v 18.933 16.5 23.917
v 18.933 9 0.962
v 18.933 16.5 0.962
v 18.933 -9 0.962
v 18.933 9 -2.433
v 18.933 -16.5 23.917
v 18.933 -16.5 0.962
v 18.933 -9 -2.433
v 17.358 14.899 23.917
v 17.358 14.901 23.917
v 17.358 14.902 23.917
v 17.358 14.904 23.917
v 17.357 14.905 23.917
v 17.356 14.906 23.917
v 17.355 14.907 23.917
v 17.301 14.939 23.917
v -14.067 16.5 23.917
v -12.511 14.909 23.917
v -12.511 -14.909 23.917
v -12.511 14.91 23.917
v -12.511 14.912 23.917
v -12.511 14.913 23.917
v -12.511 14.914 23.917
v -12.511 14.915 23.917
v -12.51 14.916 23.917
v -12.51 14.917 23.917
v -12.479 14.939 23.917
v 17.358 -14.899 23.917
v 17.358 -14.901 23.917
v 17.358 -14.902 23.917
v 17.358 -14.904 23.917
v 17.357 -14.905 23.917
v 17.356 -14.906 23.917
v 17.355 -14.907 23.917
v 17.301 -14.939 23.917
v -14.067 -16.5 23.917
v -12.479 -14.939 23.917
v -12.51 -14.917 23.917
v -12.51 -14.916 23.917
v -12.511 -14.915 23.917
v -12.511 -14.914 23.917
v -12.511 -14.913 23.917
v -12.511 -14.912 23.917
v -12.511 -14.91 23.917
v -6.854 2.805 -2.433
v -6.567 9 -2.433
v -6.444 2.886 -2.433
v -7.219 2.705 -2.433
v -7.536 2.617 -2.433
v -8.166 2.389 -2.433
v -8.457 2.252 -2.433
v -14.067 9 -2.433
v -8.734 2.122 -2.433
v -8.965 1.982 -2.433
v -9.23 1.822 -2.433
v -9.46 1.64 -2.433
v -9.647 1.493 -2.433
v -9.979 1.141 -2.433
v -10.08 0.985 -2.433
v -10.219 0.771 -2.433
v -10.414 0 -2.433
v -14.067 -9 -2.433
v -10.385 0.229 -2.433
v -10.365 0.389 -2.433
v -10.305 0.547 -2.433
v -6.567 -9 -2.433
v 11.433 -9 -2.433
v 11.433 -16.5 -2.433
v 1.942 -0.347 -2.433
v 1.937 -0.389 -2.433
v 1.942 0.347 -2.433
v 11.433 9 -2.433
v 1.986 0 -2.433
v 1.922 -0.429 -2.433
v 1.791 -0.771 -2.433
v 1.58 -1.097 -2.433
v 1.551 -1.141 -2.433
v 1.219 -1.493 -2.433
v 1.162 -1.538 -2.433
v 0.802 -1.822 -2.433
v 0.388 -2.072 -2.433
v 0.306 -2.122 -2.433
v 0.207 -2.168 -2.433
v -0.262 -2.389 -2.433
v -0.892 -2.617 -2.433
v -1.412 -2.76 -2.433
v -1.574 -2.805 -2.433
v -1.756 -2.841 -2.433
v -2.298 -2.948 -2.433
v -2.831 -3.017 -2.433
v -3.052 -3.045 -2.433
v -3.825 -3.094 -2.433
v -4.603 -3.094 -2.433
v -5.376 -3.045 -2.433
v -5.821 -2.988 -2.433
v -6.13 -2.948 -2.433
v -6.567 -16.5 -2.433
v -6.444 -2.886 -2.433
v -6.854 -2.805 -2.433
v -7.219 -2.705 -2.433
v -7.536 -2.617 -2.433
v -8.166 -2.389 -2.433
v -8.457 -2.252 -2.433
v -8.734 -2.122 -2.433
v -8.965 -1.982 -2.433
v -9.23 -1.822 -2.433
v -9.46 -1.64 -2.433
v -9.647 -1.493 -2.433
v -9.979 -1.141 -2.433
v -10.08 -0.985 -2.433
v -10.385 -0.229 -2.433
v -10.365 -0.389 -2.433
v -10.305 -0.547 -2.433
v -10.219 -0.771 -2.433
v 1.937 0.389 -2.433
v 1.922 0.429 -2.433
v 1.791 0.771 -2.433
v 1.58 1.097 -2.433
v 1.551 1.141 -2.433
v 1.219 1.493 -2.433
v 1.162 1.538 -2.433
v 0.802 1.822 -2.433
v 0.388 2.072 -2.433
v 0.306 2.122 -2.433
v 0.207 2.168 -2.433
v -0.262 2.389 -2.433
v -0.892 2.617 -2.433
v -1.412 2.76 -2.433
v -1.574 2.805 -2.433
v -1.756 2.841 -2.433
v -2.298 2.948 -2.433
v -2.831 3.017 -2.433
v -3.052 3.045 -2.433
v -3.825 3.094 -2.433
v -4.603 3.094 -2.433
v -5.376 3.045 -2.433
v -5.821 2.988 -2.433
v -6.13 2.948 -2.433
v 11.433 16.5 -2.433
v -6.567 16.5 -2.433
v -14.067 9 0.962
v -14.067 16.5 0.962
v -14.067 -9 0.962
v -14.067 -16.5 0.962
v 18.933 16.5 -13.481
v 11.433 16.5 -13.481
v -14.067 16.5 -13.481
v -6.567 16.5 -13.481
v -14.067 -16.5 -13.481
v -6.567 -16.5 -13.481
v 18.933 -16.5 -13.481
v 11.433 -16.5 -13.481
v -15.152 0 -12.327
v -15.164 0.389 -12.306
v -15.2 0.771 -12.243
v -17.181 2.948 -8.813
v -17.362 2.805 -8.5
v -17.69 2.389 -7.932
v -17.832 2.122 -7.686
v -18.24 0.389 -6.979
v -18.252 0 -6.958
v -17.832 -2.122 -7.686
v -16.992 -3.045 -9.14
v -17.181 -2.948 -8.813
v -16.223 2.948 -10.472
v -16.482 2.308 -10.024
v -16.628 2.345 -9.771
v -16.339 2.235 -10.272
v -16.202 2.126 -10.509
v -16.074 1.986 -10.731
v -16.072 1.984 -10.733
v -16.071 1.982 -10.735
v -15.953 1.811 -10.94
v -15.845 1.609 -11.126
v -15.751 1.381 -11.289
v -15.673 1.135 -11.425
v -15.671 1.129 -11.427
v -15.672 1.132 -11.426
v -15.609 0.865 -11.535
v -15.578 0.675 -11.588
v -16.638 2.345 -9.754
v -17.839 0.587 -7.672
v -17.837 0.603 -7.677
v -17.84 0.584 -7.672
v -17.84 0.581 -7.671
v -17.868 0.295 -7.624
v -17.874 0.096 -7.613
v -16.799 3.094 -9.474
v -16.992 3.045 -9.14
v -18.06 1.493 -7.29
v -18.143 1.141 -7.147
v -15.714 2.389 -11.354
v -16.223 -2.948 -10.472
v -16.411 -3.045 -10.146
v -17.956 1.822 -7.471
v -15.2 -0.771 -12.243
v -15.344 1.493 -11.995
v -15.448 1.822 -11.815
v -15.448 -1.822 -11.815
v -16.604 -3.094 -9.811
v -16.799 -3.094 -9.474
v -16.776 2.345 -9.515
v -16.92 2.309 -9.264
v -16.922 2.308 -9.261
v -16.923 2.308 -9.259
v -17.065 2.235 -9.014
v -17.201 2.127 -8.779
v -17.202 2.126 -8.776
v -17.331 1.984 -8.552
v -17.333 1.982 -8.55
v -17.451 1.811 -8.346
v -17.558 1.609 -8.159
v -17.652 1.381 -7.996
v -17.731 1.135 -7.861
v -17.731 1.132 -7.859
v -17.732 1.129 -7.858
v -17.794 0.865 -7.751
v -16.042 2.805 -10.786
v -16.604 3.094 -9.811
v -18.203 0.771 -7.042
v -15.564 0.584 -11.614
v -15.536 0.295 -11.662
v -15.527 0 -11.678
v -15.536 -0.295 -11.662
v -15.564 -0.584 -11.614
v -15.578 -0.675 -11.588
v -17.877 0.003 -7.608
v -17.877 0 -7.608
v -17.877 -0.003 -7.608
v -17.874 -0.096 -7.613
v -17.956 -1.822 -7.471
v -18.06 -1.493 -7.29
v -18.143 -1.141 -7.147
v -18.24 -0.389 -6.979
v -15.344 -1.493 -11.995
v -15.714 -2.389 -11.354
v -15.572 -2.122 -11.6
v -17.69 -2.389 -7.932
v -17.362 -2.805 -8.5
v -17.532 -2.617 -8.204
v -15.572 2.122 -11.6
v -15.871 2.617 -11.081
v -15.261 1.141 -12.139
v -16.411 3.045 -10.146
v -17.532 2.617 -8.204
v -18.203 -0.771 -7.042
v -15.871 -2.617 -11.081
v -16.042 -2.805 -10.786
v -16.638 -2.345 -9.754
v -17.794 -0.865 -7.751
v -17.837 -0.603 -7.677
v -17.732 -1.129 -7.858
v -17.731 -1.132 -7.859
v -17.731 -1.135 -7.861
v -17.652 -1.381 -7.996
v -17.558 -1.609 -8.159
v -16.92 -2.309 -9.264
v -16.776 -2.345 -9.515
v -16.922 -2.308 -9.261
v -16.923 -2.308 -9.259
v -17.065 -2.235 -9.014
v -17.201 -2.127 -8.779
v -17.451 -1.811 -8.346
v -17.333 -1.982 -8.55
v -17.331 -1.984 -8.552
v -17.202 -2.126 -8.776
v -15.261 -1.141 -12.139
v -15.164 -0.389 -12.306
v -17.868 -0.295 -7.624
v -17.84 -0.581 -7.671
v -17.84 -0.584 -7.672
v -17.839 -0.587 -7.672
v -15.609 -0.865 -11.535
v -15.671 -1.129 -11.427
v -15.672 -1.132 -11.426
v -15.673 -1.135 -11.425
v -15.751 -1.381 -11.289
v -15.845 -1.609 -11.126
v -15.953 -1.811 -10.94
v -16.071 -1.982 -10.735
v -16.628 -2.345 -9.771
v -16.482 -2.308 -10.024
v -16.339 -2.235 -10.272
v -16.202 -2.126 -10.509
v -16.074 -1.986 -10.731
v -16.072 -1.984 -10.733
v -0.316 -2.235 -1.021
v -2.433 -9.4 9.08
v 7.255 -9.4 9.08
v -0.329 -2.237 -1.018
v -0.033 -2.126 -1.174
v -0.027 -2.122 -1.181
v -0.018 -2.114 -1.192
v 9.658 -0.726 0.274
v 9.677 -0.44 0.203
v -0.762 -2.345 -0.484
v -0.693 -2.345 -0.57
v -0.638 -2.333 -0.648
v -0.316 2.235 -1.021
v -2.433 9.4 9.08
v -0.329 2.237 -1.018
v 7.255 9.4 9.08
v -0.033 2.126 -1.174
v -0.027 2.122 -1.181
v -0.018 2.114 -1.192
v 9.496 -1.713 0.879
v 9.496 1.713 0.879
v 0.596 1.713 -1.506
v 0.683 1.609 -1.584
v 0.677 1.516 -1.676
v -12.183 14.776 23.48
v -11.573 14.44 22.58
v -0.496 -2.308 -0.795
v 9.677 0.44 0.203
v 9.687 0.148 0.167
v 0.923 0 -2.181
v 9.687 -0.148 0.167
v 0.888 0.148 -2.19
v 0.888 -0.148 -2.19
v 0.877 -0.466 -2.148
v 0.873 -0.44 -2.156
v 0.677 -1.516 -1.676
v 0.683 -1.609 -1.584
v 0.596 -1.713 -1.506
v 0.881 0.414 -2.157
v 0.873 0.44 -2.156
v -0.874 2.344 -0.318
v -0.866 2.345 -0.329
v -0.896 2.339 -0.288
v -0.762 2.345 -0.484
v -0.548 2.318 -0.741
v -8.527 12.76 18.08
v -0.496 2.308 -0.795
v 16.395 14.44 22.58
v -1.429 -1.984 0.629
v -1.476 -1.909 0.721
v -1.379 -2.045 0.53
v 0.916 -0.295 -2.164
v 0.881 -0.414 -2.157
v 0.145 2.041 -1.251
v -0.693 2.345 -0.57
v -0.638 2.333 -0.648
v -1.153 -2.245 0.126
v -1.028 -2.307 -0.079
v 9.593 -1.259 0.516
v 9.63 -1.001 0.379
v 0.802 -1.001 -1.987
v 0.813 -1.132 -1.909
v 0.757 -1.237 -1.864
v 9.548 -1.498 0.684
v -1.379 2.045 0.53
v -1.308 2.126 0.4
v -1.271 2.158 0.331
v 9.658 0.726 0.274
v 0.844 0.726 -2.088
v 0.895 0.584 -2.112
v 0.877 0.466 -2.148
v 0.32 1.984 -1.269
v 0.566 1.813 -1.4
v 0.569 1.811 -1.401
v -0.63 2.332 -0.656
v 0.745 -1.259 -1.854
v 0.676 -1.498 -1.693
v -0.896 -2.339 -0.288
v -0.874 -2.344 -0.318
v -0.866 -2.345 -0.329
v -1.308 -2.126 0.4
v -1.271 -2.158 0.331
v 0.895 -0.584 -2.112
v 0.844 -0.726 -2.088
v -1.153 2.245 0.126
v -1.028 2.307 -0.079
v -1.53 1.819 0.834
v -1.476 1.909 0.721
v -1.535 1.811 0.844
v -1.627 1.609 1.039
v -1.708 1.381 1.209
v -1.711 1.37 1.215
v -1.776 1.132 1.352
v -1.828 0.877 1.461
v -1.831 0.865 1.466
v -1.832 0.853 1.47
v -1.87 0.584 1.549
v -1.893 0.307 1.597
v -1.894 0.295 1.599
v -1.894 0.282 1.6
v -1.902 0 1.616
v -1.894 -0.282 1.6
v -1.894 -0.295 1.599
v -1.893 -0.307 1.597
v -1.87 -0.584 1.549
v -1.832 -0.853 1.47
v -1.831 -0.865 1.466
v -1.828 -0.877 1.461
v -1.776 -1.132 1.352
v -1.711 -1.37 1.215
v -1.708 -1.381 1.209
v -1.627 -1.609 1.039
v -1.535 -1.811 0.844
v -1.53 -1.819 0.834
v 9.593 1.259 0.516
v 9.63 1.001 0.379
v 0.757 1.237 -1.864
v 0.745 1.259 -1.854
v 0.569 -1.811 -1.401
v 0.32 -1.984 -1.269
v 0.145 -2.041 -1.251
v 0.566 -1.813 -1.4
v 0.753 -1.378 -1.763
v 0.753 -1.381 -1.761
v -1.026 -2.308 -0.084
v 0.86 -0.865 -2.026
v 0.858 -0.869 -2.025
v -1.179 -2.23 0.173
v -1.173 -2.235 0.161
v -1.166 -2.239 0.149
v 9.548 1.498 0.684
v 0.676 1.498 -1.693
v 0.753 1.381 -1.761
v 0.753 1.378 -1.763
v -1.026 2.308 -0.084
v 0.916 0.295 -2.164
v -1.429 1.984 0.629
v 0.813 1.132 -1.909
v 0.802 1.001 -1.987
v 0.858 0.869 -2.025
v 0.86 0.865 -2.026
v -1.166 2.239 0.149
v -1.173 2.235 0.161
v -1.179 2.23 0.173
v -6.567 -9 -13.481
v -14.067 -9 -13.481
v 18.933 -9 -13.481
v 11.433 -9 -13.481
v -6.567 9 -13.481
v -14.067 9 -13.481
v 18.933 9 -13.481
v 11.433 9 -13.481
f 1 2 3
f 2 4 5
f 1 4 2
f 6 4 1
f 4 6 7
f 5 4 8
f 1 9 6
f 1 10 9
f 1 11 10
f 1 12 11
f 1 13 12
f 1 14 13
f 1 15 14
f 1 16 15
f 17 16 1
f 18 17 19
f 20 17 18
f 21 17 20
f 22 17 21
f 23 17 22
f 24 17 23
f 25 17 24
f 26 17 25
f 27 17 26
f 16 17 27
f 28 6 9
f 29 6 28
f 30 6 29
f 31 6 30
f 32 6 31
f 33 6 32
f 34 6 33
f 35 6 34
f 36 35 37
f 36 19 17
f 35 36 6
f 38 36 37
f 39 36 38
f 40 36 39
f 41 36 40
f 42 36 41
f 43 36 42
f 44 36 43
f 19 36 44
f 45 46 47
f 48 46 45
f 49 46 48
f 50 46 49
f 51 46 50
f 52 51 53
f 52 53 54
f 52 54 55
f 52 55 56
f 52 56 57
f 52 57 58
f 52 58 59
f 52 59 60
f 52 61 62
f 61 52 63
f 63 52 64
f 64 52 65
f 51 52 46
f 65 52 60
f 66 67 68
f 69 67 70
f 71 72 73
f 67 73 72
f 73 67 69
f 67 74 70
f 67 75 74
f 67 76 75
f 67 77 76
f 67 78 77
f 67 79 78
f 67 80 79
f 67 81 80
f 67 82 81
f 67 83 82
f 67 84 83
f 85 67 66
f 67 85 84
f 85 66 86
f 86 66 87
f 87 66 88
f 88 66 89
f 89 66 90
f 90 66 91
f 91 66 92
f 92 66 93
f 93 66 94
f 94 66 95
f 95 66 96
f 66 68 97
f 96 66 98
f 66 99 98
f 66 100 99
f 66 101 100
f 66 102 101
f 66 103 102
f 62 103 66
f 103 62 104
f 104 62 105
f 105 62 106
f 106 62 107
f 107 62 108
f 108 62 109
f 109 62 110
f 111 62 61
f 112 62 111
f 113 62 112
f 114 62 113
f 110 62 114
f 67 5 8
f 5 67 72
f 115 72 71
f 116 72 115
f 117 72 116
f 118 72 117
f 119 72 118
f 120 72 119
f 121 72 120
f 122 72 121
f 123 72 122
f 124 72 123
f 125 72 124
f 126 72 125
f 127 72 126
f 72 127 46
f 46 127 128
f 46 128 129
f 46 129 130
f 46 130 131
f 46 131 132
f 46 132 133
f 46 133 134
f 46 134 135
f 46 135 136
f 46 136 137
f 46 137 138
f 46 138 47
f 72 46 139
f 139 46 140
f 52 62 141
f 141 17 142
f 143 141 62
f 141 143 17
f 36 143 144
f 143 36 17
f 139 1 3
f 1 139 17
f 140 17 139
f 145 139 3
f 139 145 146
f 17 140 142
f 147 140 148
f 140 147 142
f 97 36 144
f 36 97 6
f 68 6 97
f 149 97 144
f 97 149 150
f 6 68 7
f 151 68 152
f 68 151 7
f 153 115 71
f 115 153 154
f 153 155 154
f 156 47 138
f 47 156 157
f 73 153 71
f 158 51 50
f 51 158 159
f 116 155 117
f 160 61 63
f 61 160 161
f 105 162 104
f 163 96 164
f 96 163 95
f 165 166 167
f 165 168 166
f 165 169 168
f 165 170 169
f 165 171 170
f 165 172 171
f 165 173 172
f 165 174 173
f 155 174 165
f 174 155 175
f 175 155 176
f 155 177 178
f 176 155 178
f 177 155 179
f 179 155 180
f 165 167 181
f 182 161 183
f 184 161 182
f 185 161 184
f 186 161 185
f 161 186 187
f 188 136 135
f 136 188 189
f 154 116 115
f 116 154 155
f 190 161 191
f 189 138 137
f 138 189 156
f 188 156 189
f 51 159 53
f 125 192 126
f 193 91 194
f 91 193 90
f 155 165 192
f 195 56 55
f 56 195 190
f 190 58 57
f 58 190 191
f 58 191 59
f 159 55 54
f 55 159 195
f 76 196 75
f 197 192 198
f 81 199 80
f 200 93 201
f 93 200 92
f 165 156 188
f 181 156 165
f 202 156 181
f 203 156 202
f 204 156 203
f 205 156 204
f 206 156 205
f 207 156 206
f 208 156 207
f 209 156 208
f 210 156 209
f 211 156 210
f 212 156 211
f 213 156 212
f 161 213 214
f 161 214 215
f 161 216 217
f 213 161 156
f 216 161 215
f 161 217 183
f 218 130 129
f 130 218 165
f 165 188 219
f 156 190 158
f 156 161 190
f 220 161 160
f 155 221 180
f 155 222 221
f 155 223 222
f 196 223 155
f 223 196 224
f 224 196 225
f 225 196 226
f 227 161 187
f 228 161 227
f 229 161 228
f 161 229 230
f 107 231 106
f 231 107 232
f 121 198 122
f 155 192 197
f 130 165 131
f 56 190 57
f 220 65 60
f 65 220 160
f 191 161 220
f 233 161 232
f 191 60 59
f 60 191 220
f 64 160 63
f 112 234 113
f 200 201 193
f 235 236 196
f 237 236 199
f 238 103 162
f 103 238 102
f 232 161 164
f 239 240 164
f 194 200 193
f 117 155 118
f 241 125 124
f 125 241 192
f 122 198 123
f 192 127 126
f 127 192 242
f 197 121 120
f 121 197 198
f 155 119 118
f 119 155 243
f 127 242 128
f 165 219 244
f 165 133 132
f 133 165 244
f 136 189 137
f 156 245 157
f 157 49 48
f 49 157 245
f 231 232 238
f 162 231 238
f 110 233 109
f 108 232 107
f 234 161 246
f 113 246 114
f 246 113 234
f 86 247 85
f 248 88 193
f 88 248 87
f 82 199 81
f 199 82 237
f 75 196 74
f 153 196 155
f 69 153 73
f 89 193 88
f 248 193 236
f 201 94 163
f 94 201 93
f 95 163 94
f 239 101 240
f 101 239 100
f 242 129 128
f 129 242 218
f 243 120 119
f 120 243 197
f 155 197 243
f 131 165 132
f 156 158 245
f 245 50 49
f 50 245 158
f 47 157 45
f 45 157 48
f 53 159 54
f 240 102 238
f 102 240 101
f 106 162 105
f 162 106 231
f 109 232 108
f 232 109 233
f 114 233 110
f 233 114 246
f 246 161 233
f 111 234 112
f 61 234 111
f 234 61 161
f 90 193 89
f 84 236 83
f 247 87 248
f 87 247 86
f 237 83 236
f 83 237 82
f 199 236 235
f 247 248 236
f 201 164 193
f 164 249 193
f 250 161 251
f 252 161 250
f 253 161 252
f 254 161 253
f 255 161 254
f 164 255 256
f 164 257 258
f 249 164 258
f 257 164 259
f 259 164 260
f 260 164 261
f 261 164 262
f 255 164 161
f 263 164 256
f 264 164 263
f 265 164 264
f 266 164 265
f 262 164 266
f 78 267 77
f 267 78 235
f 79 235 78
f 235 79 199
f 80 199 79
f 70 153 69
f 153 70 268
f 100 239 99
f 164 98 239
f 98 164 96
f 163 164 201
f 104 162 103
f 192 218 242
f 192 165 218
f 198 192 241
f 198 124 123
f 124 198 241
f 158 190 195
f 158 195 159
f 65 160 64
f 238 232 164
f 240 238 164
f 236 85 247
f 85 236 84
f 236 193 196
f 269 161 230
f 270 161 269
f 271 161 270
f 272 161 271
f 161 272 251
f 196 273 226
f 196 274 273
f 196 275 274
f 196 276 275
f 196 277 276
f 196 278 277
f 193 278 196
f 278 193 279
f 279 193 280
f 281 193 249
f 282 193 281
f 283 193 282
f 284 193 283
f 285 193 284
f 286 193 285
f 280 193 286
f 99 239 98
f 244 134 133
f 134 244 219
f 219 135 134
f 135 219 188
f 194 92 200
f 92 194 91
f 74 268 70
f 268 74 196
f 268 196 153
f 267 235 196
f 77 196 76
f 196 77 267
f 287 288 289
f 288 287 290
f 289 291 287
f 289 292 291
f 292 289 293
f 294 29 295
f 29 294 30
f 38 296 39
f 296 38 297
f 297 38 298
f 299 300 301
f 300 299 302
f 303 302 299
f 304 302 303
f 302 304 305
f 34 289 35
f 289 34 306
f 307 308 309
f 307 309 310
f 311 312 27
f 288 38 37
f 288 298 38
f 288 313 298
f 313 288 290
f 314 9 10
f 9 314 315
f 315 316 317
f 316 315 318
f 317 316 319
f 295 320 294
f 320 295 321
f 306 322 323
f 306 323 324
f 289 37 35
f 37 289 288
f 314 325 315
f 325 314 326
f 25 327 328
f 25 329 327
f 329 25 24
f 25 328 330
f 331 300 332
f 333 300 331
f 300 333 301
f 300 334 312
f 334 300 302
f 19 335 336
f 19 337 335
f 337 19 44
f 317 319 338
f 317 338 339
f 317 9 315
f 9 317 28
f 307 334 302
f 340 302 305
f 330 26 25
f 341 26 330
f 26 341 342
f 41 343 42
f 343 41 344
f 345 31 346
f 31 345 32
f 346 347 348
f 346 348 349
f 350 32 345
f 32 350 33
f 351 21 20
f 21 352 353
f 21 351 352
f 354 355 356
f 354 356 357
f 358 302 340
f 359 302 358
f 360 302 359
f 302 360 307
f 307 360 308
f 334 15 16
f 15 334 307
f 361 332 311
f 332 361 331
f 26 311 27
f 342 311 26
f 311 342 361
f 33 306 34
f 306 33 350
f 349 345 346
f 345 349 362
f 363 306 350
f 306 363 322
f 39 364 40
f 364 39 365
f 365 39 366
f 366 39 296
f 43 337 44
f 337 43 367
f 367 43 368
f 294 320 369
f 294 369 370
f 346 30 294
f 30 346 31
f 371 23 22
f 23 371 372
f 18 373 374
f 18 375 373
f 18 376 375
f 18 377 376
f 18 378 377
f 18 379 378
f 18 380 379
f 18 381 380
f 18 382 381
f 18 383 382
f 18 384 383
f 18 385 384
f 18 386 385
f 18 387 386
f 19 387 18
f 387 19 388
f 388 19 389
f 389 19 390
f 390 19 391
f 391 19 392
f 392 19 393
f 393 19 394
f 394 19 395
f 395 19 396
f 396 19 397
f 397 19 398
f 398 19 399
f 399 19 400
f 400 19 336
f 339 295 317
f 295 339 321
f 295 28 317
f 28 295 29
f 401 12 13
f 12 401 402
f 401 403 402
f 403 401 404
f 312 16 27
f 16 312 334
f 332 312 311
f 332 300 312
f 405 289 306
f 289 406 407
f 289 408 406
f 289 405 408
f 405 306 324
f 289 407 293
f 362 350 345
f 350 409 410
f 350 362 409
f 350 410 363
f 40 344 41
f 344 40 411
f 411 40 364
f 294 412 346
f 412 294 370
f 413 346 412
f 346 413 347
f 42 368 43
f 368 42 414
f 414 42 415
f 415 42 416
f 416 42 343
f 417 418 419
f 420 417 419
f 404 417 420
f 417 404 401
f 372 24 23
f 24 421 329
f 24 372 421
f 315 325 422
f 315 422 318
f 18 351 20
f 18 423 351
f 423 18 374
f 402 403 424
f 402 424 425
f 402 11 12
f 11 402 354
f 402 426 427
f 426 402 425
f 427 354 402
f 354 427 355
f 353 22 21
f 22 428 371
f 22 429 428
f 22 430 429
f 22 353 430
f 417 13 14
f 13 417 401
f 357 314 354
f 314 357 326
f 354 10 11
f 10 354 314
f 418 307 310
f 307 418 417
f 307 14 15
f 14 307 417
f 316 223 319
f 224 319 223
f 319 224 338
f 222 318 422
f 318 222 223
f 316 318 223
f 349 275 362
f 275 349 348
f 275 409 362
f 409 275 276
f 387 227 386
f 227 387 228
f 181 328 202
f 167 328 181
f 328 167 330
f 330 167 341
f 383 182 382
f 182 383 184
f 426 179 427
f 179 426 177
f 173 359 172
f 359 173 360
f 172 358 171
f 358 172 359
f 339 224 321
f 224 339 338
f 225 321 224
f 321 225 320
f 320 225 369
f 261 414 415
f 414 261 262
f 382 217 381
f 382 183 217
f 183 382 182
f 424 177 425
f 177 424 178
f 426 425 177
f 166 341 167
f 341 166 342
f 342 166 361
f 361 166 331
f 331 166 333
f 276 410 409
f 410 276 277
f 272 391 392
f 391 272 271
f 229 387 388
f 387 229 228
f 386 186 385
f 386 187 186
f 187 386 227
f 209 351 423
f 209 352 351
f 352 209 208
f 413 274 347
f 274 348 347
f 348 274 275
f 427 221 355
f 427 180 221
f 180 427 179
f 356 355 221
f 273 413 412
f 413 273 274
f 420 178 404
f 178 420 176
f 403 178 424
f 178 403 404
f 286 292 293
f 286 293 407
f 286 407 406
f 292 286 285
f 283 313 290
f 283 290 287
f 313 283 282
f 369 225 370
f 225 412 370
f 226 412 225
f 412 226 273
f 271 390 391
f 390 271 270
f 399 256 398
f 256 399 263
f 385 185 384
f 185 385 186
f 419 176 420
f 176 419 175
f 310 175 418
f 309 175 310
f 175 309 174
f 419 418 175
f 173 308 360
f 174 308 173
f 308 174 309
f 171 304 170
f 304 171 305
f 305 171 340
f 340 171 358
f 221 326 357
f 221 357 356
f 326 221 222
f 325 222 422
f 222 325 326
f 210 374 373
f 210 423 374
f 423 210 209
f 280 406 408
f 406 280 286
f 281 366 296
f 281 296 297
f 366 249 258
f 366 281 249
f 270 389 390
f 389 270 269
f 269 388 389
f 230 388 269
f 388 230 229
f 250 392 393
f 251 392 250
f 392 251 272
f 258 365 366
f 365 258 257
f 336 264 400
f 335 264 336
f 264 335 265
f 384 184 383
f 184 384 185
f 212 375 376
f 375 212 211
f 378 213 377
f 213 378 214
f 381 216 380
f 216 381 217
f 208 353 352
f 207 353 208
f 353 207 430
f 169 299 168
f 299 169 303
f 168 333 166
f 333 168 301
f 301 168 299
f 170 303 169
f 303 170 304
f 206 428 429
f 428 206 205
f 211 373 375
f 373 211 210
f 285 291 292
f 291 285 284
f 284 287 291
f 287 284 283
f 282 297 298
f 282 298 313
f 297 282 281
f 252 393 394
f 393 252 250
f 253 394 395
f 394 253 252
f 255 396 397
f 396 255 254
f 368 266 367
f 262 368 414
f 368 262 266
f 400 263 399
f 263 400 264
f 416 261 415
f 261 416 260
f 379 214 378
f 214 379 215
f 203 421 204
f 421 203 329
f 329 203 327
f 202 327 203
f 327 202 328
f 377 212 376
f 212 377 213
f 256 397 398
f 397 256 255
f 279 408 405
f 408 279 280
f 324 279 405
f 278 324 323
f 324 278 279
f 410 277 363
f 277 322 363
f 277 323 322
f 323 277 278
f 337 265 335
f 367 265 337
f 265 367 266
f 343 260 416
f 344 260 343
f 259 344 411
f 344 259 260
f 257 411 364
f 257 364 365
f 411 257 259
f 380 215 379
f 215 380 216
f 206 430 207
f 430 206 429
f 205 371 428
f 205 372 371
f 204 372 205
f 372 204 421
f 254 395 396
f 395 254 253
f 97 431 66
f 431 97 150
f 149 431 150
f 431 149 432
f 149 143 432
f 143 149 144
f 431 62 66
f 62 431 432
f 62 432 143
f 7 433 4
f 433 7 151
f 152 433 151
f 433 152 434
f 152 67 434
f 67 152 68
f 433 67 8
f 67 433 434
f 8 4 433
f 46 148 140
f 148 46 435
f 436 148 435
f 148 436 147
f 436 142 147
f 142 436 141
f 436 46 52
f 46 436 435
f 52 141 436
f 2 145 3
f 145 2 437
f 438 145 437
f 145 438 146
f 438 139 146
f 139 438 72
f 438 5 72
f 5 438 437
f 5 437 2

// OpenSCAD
$fn = 50;

// pyssla
tolerance=0.2;

od = 4.5 + tolerance;
id = 3;
h = 5 + tolerance;

thickness = 3;

angle = 30;

size=30;
length = sin(90-angle)*(size*0.75);

module bead() {
    difference() {
        cylinder(d=od, h=h);
        cylinder(d=id, h=h);
    }
}


dAdj = (cos(90-angle/2)*od/2);

difference() {
    
    
    
    union() {
        
        translate([-(size+thickness)/2 + 4*dAdj,-(size+thickness)/2,-od*2*cos(90-angle/2)]) {
            cube([(size+thickness),(size+thickness),od/2*sin(90-angle/2)+2*od*sin(90-angle/2)+size/2]);
        }
        
        // Shaft
        translate([-sin(90-angle)*(length-tolerance), 0, -cos(90-angle)*(length-tolerance)]) {
            rotate([0,90-angle,0]) { 
                cylinder(d=od+thickness/2,h=length+sin(90-angle)*thickness); 
            }
        }
    }
    
    aligner_cavity();
    
    // Stands
    

}

standHeight = cos(90-angle)*length + od;
translate([-(size+thickness)/2 + 4*dAdj,-(size+thickness)/2,-(length+od)*cos(90-angle/2)]) {
    
    ratio = 4;
    sAdj = size+thickness - size/ratio;
    
    translate([0,0,-standHeight/2]) {
        cube([size/ratio, size/ratio, standHeight]);
    }
    
    translate([sAdj, 0,-standHeight/2]) {
        cube([size/ratio, size/ratio, standHeight]);
    }
    
    translate([0,sAdj,-standHeight/2]) {
        cube([size/ratio, size/ratio, standHeight]);
    }
    
    translate([sAdj,sAdj,-standHeight/2]) {
        cube([size/ratio, size/ratio, standHeight]);
    }
}


module aligner_cavity() {
    

    

    //  Hoppers
    hull() {
        // Top Hopper
        x = 2*od*sin(90-angle/2)+dAdj;
        y = 4*od;
        translate([-4*dAdj,-y/2,x-dAdj]) {
            translate([x/2, y/2])
            linear_extrude(height=size/2, scale=[size/x, size/y])
            square([x,y], center=true);
        }
        

        // Bottom Hopper
        rotate([90-angle/2,0,90]) {
        linear_extrude(height=2*od) {

            union() {
                polygon(points=[
                    [-od/2,0],
                    [+od/2,0],
                    [2*od,2*od],
                    [-2*od,2*od],
                ]);
            }
        }

        // Bottom Grove
        
        translate([0,0,-dAdj]) {
            cylinder(d=od,h=2*od+dAdj);
            }
        }
    }
    
    // Shaft
    
    translate([-sin(90-angle)*length, 0, -cos(90-angle)*length]) {
        rotate([0,90-angle,0]) { 
            cylinder(d=od,h=length); 
        }
    }
}
